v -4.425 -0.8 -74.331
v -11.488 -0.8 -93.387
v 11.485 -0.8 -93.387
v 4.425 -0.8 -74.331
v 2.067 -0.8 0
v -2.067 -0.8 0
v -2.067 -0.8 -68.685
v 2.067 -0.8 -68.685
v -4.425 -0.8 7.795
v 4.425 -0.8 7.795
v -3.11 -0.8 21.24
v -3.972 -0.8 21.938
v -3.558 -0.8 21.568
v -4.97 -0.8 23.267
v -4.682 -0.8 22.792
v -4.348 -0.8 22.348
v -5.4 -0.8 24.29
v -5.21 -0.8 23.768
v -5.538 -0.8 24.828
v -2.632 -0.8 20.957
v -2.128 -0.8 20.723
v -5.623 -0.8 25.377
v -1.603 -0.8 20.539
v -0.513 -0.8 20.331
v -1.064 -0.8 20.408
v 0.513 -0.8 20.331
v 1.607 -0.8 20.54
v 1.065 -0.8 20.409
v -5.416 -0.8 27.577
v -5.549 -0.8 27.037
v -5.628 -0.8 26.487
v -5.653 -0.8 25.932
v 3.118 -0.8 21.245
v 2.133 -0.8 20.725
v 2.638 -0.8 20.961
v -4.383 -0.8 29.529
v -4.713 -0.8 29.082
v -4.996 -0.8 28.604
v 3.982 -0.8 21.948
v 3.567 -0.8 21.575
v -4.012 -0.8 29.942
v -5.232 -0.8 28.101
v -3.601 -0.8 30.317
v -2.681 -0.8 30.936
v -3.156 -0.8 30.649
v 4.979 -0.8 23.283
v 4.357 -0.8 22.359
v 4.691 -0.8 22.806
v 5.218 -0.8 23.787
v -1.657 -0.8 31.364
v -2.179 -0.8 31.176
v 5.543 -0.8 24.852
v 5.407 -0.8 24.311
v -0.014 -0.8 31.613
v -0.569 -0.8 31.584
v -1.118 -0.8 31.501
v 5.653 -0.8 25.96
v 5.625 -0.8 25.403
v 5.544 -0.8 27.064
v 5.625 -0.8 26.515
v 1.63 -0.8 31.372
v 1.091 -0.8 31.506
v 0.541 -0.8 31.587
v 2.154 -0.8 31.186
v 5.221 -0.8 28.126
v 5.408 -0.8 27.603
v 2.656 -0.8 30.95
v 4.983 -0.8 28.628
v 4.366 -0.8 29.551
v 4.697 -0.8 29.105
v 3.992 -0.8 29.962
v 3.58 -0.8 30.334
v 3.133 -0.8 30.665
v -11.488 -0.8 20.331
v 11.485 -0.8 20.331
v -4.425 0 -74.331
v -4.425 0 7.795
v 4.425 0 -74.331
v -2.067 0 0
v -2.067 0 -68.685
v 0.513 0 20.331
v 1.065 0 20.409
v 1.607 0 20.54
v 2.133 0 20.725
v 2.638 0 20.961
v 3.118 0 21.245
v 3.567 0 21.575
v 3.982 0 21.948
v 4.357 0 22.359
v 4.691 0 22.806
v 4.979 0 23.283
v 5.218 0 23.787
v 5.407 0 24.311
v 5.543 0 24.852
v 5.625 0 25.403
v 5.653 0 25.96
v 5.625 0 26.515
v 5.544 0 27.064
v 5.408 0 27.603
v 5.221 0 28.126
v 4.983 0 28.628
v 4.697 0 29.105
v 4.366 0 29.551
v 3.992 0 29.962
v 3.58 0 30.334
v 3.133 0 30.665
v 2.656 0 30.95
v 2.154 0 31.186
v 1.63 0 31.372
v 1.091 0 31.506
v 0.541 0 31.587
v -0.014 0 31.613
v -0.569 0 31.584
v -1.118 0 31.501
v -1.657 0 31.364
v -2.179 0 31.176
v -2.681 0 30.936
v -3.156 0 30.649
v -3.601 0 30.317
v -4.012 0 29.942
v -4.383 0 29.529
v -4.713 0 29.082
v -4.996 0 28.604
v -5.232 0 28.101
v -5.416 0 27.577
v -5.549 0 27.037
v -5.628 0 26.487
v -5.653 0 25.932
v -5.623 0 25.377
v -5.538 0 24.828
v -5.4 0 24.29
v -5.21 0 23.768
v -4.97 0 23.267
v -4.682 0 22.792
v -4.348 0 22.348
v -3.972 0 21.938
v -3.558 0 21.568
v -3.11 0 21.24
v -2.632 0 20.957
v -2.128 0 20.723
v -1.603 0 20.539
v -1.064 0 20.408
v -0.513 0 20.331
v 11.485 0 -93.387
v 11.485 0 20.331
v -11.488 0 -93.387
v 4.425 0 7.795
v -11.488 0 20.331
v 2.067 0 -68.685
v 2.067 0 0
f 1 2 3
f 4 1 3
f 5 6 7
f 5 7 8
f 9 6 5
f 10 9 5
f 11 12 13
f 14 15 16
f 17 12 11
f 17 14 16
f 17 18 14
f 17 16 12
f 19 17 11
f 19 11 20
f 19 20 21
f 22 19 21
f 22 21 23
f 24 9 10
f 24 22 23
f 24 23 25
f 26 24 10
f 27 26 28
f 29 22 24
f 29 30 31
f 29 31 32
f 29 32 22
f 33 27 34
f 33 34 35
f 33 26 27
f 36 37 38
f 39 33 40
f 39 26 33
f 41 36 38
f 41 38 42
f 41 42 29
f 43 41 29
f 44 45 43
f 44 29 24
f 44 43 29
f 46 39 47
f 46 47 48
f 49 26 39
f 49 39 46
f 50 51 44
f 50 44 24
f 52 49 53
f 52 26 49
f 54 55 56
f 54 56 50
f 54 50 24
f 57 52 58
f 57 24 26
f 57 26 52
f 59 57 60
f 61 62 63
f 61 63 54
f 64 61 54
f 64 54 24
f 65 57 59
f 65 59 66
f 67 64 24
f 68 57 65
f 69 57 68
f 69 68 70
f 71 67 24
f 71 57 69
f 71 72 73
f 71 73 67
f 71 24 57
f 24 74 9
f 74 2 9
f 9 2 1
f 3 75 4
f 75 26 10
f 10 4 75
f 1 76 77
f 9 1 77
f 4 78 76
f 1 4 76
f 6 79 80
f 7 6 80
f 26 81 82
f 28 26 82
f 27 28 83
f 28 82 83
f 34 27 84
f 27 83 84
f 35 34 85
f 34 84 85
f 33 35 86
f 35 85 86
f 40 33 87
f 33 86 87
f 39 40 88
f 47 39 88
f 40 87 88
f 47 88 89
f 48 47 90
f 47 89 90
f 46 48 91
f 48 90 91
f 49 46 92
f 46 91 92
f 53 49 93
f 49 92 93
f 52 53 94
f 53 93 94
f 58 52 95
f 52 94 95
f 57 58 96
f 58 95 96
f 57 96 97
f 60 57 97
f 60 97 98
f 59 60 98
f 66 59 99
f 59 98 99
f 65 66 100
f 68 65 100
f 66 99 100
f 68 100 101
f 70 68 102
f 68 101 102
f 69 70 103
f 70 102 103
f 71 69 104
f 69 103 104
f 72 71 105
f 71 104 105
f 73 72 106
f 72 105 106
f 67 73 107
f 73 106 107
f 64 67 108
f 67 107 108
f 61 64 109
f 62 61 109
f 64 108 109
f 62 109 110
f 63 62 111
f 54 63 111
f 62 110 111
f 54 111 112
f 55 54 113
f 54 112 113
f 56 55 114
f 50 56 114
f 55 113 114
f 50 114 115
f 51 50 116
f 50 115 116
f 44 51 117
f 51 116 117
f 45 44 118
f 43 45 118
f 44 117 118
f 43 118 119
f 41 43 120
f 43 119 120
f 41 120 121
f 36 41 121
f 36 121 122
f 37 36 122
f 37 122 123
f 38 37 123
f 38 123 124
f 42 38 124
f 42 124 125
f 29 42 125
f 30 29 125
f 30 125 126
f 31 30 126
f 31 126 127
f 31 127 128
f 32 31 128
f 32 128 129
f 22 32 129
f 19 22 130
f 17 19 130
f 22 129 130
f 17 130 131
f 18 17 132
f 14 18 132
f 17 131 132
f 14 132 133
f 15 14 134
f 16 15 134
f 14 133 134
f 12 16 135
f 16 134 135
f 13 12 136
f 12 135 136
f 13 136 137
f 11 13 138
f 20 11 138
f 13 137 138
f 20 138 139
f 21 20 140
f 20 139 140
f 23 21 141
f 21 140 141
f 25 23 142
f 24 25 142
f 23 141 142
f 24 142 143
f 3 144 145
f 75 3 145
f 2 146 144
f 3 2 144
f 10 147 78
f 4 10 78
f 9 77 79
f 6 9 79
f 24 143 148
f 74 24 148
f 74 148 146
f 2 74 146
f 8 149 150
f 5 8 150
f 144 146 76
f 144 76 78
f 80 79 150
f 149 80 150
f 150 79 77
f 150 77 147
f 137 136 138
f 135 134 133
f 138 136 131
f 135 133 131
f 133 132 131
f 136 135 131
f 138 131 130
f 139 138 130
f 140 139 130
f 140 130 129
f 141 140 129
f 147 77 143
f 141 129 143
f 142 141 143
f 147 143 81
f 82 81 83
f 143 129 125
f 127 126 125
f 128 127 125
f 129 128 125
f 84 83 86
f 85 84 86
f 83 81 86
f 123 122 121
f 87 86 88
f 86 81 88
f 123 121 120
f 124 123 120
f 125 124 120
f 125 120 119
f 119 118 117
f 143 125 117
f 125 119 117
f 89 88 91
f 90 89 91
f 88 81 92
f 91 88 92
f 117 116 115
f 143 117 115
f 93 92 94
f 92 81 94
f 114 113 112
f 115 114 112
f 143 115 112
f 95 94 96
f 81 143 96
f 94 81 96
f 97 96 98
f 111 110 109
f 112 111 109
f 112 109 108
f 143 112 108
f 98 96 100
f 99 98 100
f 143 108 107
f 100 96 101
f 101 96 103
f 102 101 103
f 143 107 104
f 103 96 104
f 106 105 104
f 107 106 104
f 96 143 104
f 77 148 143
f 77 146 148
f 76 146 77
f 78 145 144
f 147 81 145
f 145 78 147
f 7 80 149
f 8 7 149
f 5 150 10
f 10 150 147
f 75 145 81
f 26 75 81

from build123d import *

# Parameters (mm, degrees)
F0_W     = 2.3575491577
F0_H     = 19.056274371
F0_W_2   = 4.1343827633
F1_DEPTH = 0.8


with BuildPart() as f1:
    # F0 (on Front) → F1 (new body)
    with BuildSketch(Plane.XZ):
        with BuildLine():
            ThreePointArc((0.5134190636, 20.3306143382), (0, 20.3072495762), (-0.5134190636, 20.3306143382))
            Line((-0.5134190636, 20.3306143382), (-11.4882850616, 20.3306143382))
            Line((-11.4882850616, 20.3306143382), (-11.4882850616, -93.387475984))
            Line((-11.4882850616, -93.387475984), (-4.4247405394, -93.387475984))
            Line((-4.4247405394, -93.387475984), (-4.4247405394, -74.3312016129))
            Line((-4.4247405394, -74.3312016129), (-4.4247405394, 7.7945953777))
            Line((-4.4247405394, 7.7945953777), (-2.0671913816, 0))
            Line((-2.0671913816, 0), (-2.0671913816, -68.6852410436))
            Line((-2.0671913816, -68.6852410436), (2.0671913816, -68.6852410436))
            Line((2.0671913816, -68.6852410436), (2.0671913816, 0))
            Line((2.0671913816, 0), (4.4247405394, 7.7945953777))
            Line((4.4247405394, 7.7945953777), (4.4247405394, -74.3312016129))
            Line((4.4247405394, -74.3312016129), (4.4247405394, -93.387475984))
            Line((4.4247405394, -93.387475984), (11.4850704372, -93.387475984))
            Line((11.4850704372, -93.387475984), (11.4850704372, 20.3306143382))
            Line((11.4850704372, 20.3306143382), (0.5134190636, 20.3306143382))
        make_face()
        with BuildLine():
            ThreePointArc((0.5134190636, 20.3306143382), (4.1745945423, 22.1487100844), (5.6526372145, 25.9598867907))
            ThreePointArc((5.6526372145, 25.9598867907), (-3.8111767063, 30.134481333), (-0.5134190636, 20.3306143382))
            Line((-0.5134190636, 20.3306143382), (0.5134190636, 20.3306143382))
        make_face()
        with BuildLine():
            Line((0.5134190636, 20.3306143382), (-0.5134190636, 20.3306143382))
            ThreePointArc((-0.5134190636, 20.3306143382), (0, 20.3072495762), (0.5134190636, 20.3306143382))
        make_face()
        with Locations((3.2459659605, -83.8593387985)):
            Rectangle(F0_W, F0_H)
        with Locations((0, -83.8593387985)):
            Rectangle(F0_W_2, F0_H)
        with Locations((-3.2459659605, -83.8593387985)):
            Rectangle(F0_W, F0_H)
    extrude(amount=F1_DEPTH)


solid = f1.part
